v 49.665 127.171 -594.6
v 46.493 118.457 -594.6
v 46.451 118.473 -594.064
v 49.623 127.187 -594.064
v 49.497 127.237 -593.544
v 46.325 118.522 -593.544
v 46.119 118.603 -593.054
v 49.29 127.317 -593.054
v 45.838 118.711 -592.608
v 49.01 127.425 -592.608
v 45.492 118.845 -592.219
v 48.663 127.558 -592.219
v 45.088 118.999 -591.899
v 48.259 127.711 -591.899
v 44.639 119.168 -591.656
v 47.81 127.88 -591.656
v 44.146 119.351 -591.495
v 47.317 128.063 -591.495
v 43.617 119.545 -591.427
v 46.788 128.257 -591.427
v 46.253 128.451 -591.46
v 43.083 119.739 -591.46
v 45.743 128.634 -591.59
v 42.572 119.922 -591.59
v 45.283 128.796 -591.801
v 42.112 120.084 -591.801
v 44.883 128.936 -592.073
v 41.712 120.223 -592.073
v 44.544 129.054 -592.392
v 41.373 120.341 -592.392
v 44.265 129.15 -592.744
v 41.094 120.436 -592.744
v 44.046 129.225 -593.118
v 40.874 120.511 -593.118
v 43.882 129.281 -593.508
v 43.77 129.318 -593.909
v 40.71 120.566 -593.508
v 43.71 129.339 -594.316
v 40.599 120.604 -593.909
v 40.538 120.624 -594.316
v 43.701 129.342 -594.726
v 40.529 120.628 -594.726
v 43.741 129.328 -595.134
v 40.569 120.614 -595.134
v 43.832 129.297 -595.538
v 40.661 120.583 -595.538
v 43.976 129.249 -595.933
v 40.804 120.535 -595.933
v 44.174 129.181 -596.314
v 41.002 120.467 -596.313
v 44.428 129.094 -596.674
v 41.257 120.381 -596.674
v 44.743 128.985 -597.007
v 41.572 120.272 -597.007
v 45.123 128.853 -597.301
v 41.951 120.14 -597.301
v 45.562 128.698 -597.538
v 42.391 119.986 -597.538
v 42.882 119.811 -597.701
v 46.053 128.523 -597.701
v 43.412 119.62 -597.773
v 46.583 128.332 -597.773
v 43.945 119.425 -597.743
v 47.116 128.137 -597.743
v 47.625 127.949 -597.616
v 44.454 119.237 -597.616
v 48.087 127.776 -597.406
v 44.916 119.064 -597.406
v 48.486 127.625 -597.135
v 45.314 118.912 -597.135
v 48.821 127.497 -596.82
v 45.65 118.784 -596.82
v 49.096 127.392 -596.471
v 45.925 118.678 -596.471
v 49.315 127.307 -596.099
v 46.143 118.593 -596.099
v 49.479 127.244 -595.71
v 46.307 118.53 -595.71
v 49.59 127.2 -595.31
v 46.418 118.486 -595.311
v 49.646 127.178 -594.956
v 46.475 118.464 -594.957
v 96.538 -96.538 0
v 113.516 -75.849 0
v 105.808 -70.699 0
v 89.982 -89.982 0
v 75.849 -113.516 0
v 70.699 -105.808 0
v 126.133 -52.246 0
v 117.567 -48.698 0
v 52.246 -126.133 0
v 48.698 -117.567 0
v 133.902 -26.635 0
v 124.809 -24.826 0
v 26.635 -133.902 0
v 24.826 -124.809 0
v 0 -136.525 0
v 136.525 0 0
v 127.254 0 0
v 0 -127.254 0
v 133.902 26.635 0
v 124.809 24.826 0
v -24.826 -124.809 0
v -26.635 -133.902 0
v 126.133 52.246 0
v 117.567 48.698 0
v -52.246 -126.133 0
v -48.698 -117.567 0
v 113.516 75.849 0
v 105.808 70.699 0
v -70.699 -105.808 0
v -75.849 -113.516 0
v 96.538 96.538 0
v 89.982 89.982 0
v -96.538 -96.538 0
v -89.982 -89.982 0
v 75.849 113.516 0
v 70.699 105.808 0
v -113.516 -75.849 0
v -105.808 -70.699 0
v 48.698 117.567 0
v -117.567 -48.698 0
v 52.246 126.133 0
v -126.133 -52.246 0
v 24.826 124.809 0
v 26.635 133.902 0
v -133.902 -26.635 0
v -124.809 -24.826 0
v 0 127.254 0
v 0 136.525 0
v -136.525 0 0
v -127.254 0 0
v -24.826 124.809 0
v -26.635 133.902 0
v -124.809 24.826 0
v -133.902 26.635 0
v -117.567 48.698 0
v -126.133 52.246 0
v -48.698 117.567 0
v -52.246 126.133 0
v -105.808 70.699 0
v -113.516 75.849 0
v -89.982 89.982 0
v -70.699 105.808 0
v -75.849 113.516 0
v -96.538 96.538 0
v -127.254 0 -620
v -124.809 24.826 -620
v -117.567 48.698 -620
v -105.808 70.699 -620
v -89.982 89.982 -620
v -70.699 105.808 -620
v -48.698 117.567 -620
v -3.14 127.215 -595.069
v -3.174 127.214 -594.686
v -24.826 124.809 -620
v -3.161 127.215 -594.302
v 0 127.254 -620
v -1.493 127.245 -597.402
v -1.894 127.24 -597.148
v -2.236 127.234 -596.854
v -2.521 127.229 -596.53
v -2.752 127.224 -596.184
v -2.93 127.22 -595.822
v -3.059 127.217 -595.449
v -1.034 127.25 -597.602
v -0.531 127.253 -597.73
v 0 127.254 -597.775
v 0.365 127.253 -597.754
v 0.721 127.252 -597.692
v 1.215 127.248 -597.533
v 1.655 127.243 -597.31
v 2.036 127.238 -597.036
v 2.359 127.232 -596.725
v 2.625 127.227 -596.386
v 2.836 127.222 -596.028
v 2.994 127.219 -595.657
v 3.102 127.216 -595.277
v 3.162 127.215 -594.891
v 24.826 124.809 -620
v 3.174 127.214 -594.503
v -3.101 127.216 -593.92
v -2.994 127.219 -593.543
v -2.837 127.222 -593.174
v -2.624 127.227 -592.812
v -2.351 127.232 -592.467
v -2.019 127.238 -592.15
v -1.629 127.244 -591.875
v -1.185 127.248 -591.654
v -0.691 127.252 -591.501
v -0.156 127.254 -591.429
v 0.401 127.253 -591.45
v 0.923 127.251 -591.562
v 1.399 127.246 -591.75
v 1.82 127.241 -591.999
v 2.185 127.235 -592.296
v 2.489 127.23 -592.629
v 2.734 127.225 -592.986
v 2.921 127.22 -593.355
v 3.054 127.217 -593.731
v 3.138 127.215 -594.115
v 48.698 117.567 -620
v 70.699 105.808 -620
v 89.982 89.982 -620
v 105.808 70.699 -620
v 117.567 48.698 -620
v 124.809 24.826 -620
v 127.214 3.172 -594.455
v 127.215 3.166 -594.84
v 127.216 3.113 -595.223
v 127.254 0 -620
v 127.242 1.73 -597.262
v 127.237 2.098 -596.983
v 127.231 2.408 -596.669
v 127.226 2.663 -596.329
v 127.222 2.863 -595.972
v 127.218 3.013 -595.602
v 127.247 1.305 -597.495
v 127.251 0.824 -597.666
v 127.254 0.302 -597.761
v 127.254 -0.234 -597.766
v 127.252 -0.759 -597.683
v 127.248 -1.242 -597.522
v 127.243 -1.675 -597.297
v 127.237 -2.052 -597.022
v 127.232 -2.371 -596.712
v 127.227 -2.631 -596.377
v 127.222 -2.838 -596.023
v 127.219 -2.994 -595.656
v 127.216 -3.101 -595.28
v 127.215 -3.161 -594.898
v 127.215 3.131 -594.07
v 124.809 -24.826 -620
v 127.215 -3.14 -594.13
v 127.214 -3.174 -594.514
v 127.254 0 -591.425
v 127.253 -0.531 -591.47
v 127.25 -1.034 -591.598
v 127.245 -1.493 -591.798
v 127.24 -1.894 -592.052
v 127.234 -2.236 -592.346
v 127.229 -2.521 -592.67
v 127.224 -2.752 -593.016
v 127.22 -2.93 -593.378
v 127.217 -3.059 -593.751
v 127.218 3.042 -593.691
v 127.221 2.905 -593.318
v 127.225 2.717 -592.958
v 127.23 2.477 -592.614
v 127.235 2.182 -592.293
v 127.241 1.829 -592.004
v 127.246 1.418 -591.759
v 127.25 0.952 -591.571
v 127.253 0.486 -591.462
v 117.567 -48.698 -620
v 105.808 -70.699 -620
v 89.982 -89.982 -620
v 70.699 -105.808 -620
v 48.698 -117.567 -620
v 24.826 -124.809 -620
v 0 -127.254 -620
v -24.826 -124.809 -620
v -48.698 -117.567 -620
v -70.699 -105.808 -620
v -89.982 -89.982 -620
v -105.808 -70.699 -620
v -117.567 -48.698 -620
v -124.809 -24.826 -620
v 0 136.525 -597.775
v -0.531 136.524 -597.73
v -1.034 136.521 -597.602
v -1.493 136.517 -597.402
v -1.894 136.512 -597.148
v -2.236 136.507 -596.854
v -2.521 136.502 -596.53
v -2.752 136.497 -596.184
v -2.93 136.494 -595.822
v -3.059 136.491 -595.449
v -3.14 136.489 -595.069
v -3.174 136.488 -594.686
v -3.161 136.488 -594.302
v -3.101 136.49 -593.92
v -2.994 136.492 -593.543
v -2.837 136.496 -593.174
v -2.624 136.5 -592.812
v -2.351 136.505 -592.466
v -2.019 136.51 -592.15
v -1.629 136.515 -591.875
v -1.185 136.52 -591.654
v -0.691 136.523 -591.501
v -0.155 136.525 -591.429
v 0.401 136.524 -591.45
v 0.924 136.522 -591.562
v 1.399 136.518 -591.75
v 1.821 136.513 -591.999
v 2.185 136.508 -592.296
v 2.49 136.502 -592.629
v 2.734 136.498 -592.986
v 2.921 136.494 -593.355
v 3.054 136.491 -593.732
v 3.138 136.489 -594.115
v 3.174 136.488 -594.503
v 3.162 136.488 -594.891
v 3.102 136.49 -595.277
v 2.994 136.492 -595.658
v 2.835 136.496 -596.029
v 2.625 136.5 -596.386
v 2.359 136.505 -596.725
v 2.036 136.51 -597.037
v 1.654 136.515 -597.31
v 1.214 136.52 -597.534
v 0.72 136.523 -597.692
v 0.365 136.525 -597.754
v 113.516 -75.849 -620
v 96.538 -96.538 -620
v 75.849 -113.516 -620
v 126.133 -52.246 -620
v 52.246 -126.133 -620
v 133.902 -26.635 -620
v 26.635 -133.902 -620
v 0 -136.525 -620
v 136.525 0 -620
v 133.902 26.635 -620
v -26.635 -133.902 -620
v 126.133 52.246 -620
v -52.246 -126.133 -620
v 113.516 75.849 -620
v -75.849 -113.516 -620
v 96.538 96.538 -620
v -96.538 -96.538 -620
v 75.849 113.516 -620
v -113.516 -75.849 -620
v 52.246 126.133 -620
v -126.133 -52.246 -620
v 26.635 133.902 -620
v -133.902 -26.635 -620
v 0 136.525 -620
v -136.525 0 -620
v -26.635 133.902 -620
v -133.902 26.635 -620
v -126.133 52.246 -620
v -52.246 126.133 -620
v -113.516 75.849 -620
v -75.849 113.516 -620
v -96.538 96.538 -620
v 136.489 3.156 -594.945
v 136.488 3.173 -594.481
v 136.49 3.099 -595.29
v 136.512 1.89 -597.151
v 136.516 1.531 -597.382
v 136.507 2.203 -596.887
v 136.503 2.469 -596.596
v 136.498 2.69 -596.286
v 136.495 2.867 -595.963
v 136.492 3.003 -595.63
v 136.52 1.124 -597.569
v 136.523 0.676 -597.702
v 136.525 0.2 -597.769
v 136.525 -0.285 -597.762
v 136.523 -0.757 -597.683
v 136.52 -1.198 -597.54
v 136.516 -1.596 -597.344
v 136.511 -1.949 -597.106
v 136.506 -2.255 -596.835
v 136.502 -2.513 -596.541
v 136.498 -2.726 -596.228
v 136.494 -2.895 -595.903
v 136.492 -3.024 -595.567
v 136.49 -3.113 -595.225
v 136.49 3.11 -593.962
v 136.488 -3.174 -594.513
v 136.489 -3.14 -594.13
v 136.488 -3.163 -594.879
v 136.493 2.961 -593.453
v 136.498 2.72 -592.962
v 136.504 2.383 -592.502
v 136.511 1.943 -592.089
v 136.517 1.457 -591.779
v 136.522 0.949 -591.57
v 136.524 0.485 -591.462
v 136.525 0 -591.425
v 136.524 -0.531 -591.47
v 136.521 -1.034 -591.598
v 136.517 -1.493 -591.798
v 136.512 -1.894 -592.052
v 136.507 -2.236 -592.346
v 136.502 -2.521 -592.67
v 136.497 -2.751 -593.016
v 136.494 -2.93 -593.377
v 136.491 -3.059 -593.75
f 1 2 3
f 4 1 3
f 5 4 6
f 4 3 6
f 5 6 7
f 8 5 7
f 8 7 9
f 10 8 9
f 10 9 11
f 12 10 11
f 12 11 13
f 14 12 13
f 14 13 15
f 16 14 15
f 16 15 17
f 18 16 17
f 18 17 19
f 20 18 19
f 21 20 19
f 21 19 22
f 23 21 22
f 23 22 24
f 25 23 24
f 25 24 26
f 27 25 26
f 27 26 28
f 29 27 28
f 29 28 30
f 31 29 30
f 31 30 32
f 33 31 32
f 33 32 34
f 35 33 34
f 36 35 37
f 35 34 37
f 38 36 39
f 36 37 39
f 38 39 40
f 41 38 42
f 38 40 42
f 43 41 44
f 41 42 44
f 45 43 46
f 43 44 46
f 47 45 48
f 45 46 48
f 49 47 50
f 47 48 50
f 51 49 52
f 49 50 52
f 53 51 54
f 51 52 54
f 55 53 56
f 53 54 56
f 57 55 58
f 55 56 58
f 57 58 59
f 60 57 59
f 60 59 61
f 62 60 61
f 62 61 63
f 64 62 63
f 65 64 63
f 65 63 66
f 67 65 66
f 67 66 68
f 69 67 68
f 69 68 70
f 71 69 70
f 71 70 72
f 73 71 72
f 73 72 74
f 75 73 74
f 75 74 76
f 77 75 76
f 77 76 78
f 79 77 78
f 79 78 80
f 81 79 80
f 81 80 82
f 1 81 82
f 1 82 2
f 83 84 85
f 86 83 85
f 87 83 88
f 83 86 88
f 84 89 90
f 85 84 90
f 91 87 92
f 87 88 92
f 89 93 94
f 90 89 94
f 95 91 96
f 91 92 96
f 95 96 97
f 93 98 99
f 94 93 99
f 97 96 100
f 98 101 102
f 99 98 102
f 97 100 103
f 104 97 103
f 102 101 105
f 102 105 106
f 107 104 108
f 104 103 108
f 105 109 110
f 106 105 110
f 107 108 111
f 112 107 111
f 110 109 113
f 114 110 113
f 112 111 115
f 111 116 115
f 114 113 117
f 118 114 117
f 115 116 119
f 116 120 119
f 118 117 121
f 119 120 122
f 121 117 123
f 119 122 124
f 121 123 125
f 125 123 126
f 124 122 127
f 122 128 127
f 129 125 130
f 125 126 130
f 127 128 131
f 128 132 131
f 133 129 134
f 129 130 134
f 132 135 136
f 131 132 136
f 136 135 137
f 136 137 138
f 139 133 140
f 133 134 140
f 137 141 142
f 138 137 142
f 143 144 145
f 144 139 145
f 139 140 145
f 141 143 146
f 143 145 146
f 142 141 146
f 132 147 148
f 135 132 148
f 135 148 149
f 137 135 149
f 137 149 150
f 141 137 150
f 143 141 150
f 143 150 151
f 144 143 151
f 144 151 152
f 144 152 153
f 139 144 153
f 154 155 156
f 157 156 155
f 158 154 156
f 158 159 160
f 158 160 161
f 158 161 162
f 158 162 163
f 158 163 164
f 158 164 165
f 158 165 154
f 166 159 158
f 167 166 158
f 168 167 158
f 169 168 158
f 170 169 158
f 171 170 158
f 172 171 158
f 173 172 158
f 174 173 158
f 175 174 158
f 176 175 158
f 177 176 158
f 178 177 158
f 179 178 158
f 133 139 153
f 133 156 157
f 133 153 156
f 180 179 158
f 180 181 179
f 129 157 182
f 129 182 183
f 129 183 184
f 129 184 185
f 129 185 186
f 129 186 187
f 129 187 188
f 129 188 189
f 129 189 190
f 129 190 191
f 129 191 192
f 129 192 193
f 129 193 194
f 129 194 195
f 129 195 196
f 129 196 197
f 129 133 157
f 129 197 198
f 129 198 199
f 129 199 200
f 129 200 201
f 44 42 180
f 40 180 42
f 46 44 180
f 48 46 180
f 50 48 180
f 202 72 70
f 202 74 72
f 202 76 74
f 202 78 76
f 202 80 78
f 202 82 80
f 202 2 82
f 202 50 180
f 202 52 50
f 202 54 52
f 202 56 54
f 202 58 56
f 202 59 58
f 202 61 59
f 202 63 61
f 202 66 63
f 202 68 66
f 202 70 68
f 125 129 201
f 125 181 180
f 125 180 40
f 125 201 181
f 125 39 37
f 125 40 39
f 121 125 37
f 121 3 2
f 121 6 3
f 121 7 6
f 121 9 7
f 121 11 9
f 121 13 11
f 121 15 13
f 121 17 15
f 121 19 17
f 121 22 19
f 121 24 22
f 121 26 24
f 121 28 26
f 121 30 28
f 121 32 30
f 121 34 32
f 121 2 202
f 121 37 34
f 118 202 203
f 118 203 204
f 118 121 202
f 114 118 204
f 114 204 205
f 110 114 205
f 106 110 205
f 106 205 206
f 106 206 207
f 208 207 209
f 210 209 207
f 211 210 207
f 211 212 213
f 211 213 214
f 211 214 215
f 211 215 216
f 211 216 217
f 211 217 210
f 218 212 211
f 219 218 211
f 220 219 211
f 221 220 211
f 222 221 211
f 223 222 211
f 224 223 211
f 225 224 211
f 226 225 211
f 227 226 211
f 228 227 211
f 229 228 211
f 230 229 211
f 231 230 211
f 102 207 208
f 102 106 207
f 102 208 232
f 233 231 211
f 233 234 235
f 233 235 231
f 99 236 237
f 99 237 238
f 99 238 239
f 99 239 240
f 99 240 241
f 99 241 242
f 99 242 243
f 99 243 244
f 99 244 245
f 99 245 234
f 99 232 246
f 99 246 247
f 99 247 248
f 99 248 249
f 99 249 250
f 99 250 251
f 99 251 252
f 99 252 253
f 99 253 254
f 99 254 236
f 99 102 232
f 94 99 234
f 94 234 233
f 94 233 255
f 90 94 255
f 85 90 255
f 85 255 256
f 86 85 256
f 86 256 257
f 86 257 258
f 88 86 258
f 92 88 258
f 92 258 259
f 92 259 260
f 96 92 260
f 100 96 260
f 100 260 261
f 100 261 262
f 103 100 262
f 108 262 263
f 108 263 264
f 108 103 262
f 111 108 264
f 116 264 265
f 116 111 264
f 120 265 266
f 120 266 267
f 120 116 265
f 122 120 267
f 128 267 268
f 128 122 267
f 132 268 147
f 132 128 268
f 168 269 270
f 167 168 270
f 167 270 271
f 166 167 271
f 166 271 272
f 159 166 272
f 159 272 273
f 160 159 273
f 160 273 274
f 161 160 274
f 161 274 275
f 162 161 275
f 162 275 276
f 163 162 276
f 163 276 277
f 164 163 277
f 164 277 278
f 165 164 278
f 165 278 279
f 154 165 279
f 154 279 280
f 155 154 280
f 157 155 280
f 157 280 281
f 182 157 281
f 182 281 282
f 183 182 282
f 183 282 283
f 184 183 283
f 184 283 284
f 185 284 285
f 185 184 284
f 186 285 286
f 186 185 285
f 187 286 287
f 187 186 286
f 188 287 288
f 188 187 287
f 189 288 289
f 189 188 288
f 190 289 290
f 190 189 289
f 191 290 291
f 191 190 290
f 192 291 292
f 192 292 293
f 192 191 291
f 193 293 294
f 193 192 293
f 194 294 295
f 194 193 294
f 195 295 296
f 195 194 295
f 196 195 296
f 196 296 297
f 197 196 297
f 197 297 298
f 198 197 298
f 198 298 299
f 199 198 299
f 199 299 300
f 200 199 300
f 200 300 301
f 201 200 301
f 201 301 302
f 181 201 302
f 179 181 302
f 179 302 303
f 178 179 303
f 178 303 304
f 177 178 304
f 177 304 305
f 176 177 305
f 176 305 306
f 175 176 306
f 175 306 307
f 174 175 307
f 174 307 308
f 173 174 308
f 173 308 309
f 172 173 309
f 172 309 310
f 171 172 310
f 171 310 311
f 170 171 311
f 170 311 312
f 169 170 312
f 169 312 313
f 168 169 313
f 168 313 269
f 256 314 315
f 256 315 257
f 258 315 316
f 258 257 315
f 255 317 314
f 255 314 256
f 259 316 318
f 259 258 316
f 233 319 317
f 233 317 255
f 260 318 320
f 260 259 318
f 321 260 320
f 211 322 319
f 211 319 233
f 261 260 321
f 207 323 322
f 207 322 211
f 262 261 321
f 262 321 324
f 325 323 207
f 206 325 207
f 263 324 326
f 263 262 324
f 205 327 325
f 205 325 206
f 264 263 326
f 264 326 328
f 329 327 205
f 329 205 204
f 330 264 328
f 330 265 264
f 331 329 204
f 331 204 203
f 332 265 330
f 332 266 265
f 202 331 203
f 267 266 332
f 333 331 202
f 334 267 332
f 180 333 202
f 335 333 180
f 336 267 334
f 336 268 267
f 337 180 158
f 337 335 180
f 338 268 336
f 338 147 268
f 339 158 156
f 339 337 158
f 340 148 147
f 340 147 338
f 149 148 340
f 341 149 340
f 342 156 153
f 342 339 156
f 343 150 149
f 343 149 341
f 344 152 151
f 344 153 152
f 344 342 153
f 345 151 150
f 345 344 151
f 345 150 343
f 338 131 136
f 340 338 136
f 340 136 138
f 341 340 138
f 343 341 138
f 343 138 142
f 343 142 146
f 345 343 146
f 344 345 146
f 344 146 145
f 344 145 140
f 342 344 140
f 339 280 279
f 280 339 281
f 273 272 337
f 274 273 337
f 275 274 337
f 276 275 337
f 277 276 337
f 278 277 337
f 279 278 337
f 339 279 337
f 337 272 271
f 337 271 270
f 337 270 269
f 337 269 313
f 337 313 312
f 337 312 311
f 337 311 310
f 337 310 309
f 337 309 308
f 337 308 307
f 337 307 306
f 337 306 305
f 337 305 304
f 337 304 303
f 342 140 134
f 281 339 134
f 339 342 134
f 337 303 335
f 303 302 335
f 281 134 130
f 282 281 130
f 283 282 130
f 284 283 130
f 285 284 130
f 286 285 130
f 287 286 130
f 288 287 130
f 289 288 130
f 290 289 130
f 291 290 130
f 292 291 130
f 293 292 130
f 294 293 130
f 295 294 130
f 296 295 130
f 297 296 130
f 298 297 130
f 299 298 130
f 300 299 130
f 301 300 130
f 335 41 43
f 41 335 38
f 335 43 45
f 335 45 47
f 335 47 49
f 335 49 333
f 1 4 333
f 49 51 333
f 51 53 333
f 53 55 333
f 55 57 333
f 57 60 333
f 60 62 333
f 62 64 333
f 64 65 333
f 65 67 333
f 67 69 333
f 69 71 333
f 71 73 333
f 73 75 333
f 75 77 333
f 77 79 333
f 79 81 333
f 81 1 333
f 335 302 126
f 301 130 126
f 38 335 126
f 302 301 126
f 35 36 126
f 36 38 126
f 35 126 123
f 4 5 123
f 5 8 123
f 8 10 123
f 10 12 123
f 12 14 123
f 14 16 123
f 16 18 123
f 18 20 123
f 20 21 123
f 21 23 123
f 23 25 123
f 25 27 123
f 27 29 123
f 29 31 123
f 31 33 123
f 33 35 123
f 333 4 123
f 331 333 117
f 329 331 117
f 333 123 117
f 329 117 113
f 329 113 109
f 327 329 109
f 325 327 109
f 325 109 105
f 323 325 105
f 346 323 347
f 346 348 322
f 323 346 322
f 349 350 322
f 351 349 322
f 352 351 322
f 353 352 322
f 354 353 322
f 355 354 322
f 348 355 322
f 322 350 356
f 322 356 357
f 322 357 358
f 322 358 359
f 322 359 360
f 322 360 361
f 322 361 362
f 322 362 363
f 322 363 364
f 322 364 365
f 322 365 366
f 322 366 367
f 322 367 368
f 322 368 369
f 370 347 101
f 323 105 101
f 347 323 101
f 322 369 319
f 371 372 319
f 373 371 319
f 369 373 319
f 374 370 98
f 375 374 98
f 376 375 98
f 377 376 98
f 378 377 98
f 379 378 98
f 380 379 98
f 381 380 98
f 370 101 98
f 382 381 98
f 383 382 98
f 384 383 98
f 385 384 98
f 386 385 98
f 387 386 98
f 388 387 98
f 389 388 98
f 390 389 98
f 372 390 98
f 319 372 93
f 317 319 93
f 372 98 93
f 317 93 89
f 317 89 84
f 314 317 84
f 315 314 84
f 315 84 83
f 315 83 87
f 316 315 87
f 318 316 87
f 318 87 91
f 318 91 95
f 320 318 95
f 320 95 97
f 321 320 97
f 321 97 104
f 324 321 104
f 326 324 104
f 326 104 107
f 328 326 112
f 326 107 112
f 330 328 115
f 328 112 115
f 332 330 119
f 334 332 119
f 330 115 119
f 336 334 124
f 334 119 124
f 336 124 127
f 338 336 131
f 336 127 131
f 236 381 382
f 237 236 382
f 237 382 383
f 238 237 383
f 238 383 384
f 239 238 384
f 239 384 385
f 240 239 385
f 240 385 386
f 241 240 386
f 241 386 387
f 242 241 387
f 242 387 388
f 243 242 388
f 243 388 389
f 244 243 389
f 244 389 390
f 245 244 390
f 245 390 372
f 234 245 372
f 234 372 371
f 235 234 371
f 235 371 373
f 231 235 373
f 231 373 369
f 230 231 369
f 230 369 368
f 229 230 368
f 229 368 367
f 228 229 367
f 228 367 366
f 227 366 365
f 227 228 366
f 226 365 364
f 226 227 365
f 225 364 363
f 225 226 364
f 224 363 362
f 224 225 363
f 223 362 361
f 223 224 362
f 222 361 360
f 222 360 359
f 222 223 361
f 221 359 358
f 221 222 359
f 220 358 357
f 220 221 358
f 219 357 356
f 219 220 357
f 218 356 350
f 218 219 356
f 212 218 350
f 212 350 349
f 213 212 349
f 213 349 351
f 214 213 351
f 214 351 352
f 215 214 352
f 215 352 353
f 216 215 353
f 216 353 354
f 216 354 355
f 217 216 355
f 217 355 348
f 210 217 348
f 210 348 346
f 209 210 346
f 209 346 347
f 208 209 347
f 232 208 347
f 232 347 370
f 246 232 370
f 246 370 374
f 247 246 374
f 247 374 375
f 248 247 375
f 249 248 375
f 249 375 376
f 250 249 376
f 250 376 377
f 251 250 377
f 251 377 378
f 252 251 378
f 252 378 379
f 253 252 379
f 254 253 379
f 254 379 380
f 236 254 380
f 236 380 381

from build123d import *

# Parameters (mm, degrees)
SKETCH11_R                    = 136.525
SKETCH11_R_2                  = 127.254
PIPE_STANDARD_S40_P10_1_DEPTH = 620
SKETCH12_R                    = 3.175
CUT_EXTRUDE1_DEPTH            = 650.367500919
SKETCH14_R                    = 3.175
CUT_EXTRUDE2_DEPTH            = 650.367501057
SKETCH15_R                    = 3.175
CUT_EXTRUDE3_DEPTH            = 650.367501057


with BuildPart() as part:
    # Sketch11 → Pipe (standard, s40) P10(1) (new body)
    with BuildSketch(Plane(origin=(0, 0, 0), x_dir=(-1, 0, 0), z_dir=(0, 0, -1))):
        Circle(SKETCH11_R)
        Circle(SKETCH11_R_2, mode=Mode.SUBTRACT)
    extrude(amount=PIPE_STANDARD_S40_P10_1_DEPTH)

    # Sketch12 → Cut-Extrude1 (cut, through all)
    with BuildSketch(Plane(origin=(0, 0, 0), x_dir=(1, 0, 0), z_dir=(0, 1, 0))):
        with Locations(Location((0, 594.6, 0), (0, 0, 90))):
            Circle(SKETCH12_R)
    extrude(amount=CUT_EXTRUDE1_DEPTH, mode=Mode.SUBTRACT)

    # Sketch14 → Cut-Extrude2 (cut, through all)
    with BuildSketch(Plane(origin=(0, 0, 0), x_dir=(0, 0, 1), z_dir=(-0.3420201433256631, -0.9396926207859105, 0))):
        with Locations(Location((-594.6, 0, 0), (0, 0, 270))):
            Circle(SKETCH14_R)
    extrude(amount=-CUT_EXTRUDE2_DEPTH, mode=Mode.SUBTRACT)

    # Sketch15 → Cut-Extrude3 (cut, through all)
    with BuildSketch(Plane(origin=(0, 0, 0), x_dir=(0, 0, -1), z_dir=(1, 0, 0))):
        with Locations(Location((594.6, 0, 0), (0, 0, 180))):
            Circle(SKETCH15_R)
    extrude(amount=CUT_EXTRUDE3_DEPTH, mode=Mode.SUBTRACT)


solid = part.part
